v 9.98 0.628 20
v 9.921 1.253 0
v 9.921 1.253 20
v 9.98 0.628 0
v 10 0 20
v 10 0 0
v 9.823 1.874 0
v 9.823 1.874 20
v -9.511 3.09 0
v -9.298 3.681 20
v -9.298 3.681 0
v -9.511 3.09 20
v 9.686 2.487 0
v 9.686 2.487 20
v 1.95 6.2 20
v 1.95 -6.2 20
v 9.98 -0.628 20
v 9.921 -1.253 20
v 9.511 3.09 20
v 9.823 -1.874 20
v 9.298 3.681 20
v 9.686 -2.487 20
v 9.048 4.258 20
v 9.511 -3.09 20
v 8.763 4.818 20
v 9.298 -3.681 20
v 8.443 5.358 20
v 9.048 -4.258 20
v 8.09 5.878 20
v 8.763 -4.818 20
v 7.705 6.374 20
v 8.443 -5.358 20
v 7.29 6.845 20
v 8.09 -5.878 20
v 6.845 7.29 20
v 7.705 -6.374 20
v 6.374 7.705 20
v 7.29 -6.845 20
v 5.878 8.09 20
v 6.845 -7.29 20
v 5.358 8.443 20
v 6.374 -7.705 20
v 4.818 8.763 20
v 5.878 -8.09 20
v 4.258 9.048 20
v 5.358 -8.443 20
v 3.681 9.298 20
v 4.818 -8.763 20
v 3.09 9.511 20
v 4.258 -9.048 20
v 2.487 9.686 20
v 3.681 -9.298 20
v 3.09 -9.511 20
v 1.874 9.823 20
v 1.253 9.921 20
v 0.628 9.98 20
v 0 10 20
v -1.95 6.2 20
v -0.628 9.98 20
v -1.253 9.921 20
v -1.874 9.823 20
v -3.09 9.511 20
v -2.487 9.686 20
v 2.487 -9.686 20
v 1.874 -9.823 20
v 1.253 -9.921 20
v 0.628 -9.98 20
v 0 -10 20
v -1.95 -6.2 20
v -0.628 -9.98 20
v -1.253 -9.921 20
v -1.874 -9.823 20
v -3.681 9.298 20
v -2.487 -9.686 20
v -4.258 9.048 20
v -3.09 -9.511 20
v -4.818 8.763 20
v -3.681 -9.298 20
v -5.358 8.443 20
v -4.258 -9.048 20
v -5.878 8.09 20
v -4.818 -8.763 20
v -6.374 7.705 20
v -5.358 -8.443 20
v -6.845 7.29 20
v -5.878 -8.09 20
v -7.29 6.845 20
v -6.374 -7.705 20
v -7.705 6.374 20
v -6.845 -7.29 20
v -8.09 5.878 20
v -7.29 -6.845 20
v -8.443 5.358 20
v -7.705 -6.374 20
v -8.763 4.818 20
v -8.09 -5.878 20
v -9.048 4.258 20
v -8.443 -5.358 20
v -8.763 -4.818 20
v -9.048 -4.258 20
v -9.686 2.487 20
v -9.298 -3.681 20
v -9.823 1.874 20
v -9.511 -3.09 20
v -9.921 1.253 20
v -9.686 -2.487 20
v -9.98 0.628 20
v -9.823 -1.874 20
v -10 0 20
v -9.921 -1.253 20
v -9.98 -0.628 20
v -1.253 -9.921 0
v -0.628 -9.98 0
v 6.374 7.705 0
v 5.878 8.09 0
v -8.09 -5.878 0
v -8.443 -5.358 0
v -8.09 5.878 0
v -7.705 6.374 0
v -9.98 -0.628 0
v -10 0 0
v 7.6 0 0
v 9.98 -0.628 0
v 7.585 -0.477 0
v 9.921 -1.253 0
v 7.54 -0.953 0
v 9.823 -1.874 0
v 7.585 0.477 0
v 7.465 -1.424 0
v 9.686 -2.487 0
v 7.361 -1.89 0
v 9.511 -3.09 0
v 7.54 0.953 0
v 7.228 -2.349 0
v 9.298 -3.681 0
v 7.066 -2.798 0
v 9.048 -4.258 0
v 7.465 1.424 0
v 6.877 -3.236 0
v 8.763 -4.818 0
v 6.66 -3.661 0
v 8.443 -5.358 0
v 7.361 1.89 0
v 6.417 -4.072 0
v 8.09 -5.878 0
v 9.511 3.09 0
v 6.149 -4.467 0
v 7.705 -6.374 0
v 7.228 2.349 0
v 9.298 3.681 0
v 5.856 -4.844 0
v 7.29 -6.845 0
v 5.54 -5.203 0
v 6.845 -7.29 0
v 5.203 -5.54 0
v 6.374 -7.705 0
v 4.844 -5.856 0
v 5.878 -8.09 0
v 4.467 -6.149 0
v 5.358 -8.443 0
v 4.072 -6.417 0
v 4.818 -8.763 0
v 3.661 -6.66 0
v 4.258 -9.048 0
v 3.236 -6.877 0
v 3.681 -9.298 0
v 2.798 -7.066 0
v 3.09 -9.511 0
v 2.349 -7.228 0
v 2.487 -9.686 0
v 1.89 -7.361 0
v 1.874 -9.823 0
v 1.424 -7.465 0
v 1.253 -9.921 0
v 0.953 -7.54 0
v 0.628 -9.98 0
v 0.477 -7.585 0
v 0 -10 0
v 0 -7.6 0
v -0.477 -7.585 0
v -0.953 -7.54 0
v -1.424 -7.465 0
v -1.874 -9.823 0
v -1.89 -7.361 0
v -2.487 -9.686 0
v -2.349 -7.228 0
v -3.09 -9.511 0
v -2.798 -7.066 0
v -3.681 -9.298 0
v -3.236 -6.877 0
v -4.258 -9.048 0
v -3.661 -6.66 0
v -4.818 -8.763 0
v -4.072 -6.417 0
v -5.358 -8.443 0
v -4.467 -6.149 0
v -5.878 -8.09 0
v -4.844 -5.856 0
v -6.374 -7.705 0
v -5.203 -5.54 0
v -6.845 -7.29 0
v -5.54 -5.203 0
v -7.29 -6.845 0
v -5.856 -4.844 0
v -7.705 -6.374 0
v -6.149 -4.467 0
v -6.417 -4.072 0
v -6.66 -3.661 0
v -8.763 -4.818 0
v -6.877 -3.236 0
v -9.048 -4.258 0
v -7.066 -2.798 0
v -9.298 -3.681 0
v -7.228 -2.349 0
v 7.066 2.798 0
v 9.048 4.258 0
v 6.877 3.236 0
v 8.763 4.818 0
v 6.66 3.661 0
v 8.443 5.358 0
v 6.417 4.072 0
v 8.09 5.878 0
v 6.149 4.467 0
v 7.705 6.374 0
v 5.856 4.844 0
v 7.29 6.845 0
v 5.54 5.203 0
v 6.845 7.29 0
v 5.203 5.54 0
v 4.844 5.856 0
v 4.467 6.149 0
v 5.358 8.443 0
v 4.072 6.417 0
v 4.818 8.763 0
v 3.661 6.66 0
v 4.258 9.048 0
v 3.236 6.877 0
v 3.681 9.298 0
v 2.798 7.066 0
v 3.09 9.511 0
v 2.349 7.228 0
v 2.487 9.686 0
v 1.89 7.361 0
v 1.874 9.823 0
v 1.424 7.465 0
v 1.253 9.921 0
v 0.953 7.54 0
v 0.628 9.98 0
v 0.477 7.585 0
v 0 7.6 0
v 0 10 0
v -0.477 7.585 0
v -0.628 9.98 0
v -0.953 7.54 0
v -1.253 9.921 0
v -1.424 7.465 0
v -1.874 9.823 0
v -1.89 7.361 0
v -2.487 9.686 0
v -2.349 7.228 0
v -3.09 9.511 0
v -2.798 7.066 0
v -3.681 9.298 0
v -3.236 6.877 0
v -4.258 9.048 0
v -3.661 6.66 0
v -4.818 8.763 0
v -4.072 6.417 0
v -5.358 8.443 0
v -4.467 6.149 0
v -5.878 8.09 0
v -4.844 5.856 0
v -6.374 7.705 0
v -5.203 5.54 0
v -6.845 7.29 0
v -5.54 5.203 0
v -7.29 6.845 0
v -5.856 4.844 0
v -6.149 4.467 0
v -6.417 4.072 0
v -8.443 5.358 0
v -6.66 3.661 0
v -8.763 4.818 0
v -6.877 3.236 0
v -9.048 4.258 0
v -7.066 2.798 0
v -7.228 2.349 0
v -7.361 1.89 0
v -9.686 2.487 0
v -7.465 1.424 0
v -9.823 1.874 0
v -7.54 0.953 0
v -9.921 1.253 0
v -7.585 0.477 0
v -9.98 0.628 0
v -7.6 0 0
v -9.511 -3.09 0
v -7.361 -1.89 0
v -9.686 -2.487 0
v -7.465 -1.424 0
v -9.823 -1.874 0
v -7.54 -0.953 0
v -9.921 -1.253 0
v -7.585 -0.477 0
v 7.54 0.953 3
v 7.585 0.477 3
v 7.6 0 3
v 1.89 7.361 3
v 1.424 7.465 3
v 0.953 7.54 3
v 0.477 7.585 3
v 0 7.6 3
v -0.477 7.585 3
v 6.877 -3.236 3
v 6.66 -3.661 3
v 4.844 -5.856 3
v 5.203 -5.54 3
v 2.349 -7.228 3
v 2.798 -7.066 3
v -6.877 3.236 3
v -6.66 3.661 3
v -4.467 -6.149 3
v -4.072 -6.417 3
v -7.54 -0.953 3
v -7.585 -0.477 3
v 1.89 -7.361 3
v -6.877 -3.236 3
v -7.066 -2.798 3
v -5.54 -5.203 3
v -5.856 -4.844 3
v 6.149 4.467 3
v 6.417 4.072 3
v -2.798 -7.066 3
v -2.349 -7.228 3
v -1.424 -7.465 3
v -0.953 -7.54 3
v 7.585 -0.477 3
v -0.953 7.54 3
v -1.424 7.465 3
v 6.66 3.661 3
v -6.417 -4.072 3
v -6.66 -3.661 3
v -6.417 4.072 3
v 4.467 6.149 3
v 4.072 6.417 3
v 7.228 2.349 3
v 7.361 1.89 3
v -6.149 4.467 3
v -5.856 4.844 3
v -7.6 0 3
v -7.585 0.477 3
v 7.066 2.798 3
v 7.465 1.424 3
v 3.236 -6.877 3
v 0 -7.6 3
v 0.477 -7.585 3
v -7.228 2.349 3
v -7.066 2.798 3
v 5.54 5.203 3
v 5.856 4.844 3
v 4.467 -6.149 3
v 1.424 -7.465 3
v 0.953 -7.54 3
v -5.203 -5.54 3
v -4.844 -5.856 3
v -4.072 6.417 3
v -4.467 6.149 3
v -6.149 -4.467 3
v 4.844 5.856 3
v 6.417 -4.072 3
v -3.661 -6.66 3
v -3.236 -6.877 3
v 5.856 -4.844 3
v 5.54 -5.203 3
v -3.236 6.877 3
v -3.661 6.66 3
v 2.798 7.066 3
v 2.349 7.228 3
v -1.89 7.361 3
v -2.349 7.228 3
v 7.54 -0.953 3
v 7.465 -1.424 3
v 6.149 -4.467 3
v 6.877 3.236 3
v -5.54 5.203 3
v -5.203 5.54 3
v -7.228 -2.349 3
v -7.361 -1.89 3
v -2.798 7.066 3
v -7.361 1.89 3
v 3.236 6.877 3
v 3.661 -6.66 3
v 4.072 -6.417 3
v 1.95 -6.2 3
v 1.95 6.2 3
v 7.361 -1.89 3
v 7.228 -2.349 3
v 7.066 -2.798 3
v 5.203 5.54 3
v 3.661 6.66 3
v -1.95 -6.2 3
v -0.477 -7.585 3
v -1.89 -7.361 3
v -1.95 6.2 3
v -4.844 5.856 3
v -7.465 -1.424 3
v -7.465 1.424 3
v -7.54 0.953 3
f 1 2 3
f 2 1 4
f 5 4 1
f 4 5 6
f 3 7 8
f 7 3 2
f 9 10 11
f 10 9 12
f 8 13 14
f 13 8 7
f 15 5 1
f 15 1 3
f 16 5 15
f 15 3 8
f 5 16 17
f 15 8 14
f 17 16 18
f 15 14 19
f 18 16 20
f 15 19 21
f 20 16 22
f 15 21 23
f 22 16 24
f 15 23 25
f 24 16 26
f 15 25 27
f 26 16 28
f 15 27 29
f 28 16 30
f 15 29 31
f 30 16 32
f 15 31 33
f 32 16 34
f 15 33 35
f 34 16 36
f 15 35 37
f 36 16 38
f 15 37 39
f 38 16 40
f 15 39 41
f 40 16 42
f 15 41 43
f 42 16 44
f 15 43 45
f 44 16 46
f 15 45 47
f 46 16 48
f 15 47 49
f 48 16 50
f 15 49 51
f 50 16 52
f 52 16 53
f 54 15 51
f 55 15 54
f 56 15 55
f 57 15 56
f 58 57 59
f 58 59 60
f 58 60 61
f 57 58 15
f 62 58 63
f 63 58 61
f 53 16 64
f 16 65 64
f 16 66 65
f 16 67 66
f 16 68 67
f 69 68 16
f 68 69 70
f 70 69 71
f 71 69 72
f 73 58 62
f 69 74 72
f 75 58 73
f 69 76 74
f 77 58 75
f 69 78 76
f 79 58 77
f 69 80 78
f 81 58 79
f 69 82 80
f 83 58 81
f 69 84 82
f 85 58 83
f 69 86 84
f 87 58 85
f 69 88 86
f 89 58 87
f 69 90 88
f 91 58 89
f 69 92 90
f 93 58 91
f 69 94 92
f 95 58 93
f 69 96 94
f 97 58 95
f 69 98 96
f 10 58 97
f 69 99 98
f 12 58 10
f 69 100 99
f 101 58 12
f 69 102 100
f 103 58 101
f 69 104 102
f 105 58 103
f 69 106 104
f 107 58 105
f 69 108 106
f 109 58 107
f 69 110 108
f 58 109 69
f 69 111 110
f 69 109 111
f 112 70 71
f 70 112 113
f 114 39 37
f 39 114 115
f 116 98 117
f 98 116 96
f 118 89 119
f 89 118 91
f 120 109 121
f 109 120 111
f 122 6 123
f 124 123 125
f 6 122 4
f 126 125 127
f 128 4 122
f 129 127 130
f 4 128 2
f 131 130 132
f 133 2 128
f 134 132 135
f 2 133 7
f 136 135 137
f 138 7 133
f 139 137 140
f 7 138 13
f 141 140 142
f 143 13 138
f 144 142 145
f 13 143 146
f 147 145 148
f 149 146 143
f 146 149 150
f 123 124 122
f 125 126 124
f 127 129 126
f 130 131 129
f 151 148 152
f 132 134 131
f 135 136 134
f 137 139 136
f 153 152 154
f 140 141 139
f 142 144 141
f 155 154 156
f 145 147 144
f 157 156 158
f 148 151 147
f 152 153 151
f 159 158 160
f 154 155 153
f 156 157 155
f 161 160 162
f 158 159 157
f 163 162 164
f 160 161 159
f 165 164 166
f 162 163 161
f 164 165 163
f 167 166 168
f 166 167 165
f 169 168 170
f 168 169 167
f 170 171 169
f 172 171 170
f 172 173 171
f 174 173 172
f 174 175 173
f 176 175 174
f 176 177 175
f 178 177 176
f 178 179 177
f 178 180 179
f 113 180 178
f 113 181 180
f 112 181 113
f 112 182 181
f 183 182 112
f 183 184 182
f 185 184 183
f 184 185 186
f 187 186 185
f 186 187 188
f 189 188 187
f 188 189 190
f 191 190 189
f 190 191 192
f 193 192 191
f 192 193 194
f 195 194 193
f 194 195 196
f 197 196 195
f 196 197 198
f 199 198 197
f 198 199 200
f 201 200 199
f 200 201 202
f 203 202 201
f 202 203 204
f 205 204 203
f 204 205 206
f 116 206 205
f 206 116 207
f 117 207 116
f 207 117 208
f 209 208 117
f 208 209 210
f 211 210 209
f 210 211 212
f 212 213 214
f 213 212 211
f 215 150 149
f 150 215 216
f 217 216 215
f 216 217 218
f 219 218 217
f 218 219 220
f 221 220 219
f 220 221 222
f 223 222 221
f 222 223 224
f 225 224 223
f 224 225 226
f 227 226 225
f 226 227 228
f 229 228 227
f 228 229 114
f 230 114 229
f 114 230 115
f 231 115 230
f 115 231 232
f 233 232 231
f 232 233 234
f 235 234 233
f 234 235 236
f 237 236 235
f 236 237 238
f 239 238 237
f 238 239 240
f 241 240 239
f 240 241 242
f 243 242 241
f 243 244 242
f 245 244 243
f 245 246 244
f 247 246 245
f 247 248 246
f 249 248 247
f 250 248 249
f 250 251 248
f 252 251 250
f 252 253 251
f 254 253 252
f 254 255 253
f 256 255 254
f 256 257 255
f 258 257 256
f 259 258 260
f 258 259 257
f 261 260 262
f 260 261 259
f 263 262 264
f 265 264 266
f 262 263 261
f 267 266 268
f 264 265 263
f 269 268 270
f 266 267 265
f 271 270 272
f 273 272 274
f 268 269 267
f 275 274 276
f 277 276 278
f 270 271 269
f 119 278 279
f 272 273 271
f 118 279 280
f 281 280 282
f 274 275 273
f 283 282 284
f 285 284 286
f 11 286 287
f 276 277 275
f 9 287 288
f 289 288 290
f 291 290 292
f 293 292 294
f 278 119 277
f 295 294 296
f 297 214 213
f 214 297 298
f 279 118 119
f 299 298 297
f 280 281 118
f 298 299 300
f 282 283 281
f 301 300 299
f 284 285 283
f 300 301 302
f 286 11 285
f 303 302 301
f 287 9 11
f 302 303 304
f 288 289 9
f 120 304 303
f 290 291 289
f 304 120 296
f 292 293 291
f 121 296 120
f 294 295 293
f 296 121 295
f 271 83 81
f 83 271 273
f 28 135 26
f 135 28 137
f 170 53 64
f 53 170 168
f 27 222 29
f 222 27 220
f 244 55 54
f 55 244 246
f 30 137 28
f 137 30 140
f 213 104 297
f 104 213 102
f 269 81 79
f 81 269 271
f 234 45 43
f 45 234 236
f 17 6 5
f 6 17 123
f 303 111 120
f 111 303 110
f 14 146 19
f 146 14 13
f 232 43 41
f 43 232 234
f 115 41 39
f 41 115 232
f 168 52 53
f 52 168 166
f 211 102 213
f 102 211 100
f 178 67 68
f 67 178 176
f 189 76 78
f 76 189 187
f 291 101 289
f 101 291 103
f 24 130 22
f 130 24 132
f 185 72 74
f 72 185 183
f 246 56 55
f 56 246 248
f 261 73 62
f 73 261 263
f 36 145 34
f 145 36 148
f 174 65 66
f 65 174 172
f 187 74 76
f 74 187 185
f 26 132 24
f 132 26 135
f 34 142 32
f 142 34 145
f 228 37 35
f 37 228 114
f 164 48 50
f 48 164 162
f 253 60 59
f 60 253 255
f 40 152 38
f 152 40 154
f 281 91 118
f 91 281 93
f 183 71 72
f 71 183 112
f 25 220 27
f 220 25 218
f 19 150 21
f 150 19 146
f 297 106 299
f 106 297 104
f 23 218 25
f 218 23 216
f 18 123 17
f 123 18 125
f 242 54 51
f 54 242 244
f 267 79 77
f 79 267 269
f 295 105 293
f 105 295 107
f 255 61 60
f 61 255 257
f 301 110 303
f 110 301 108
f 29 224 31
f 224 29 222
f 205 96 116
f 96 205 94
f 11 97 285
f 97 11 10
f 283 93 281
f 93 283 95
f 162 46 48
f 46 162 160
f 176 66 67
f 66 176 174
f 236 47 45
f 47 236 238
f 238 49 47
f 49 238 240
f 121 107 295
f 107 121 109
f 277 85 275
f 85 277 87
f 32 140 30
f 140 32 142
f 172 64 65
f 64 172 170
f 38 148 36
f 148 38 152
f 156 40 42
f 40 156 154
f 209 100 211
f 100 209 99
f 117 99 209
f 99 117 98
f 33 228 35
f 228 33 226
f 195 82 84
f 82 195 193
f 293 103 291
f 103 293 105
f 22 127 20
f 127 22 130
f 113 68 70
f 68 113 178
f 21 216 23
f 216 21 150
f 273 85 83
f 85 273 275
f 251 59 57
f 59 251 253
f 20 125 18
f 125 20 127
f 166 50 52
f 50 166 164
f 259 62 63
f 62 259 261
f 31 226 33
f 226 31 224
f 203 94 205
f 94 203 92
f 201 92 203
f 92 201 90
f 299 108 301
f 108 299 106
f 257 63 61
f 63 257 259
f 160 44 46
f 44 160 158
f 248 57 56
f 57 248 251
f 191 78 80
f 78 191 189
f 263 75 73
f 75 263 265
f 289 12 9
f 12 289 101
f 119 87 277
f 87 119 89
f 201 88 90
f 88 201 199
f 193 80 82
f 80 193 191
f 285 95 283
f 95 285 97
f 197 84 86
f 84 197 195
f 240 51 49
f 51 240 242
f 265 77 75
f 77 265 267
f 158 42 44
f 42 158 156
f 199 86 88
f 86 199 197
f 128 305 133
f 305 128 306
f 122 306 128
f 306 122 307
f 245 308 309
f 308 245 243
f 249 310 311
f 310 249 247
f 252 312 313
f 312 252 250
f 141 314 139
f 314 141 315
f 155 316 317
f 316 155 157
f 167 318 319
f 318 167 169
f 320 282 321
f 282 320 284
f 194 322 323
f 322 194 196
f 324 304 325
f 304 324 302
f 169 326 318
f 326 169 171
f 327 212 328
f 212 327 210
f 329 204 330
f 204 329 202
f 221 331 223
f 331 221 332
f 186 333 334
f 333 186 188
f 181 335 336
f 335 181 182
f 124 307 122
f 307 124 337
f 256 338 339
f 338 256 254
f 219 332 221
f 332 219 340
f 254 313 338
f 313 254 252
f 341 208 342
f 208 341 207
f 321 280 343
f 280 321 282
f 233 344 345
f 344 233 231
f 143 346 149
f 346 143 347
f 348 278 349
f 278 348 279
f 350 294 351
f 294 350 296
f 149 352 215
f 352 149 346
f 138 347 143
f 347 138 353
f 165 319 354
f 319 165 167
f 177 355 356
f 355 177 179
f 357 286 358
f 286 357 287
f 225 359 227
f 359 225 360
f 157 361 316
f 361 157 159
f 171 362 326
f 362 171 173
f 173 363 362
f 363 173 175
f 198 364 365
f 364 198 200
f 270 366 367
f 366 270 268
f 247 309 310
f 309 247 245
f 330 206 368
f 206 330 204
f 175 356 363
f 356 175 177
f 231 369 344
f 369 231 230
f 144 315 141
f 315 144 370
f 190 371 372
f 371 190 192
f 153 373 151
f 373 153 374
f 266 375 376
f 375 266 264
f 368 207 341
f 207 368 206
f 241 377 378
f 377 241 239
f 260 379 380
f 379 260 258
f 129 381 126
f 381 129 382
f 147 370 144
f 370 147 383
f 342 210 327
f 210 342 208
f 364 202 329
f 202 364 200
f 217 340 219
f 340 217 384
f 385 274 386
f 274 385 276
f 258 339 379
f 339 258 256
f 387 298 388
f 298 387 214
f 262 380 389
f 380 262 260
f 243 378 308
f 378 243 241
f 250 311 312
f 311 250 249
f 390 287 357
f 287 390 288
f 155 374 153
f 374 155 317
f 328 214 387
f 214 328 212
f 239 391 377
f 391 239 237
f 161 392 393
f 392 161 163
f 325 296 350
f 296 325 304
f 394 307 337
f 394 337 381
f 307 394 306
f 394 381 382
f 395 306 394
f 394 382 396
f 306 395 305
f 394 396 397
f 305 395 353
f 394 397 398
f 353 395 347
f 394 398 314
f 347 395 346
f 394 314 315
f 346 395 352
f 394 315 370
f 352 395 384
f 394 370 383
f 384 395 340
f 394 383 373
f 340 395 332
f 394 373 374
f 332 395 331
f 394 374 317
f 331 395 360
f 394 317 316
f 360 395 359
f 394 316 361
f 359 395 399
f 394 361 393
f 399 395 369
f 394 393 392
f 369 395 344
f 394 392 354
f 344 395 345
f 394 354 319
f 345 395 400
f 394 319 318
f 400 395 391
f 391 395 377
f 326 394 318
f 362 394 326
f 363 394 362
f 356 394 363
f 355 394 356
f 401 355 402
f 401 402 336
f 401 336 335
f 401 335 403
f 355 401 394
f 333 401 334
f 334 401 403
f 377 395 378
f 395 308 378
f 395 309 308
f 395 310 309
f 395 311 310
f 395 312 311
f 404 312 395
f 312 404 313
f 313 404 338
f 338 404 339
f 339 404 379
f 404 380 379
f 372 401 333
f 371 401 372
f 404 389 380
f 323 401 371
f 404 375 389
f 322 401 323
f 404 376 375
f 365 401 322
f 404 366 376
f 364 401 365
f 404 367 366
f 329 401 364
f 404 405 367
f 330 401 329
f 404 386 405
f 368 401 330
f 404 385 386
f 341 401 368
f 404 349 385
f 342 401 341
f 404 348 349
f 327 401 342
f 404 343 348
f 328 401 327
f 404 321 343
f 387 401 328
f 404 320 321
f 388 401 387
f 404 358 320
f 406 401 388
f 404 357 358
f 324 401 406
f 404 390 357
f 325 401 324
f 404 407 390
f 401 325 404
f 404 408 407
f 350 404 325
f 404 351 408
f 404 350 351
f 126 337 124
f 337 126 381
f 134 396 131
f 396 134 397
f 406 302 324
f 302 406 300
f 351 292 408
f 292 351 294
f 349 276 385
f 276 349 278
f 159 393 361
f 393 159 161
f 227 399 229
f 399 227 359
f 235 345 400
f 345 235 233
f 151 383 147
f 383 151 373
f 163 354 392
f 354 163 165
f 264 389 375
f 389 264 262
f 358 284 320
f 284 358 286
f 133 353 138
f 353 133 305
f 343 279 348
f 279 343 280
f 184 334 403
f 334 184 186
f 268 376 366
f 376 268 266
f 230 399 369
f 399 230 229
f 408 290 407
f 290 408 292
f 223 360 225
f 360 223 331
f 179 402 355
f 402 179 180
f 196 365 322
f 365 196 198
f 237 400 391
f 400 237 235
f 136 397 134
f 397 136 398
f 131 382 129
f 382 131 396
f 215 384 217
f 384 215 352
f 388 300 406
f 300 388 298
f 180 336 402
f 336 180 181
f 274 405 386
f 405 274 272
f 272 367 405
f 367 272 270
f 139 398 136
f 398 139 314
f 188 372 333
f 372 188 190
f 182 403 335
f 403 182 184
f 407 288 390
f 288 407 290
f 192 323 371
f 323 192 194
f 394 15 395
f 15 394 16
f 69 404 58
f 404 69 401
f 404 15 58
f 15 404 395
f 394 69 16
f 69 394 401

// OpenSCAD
THICKNESS = 3.5;

VERTICAL_LENGTH = 120;
VERTICAL_WIDTH = 12;
VERTICAL_SLOT_DIA = 4.5;
VERTICAL_SLOT_LENGTH = VERTICAL_LENGTH - 50;
VERTICAL_INLAY_DIA = 7.2;
VERTICAL_INLAY_DEPTH = 2;

HORIZONTAL_LENGTH = 120;
HORIZONTAL_WIDTH = VERTICAL_WIDTH;
HORIZONTAL_SLOT_DIA = VERTICAL_SLOT_DIA;
HORIZONTAL_SLOT_LENGTH = HORIZONTAL_LENGTH - 20;
HORIZONTAL_HEAD_DIA = 3.5;
HORIZONTAL_HEAD_INLAY_DIA = 6.4;
HORIZONTAL_HEAD_INLAY_DEPTH = VERTICAL_INLAY_DEPTH;

BASE_HEIGHT = 20;
BASE_DIA = 20;

MAGNET_DIA = 15.2;
MAGNET_THICKNESS = 3;

PROBE_INNER_DIA = 6.5;
PROBE_OUTER_DIA = PROBE_INNER_DIA + 2 * THICKNESS;
PROBE_THICKNESS = 4;
PROBE_LENGTH = 20;
PROBE_ANGLE = 30;


$fn = 100;

module slot(dia, length, thickness) {
  hull() {
    for(i = [-1, 1]) {
      translate([i * (length - dia)/2, 0, 0])
      cylinder(d = dia, h = thickness);
    }
  }
}

module vertical() {
  difference() {
    hull() {
      slot(VERTICAL_WIDTH, VERTICAL_SLOT_LENGTH, THICKNESS);
      translate([VERTICAL_LENGTH/2, 0, THICKNESS/2])
      cube(size = [VERTICAL_LENGTH - VERTICAL_SLOT_LENGTH, VERTICAL_WIDTH, THICKNESS], center = true);
    }
    slot(VERTICAL_SLOT_DIA, VERTICAL_SLOT_LENGTH - VERTICAL_WIDTH/2, THICKNESS);
    slot(VERTICAL_INLAY_DIA, VERTICAL_SLOT_LENGTH - VERTICAL_WIDTH/2 + VERTICAL_SLOT_DIA/2, VERTICAL_INLAY_DEPTH);
  }
}

module horizontal() {
  difference() {
    t = HORIZONTAL_LENGTH/2 + (HORIZONTAL_LENGTH - HORIZONTAL_SLOT_LENGTH - HORIZONTAL_WIDTH)/2;
    
    hull() {
      slot(HORIZONTAL_WIDTH, HORIZONTAL_SLOT_LENGTH, THICKNESS);
      translate([t, 0, 0])
      cylinder(d = HORIZONTAL_WIDTH, h = THICKNESS);
    }
    slot(HORIZONTAL_SLOT_DIA, HORIZONTAL_SLOT_LENGTH - HORIZONTAL_WIDTH/2, THICKNESS);
    
    translate([t, 0, 0]) {
      cylinder(d = HORIZONTAL_HEAD_DIA, h = THICKNESS);

      cylinder(d = HORIZONTAL_HEAD_INLAY_DIA, h = HORIZONTAL_HEAD_INLAY_DEPTH, $fn = 6);
    }
  }
}

module base() {
  difference() {
    cylinder(d = BASE_DIA, h = BASE_HEIGHT);
    cylinder(d = MAGNET_DIA, h = MAGNET_THICKNESS);
    delta = 0.4;
    cube(size = [THICKNESS + delta, VERTICAL_WIDTH + delta, VERTICAL_LENGTH], center = true);
  }
}

module probe() {
  difference() {
    union() {
      translate([THICKNESS/3, -(PROBE_OUTER_DIA/2-THICKNESS), 0])
      rotate([0, -PROBE_ANGLE, 0])
      cylinder(d = PROBE_OUTER_DIA, h = PROBE_THICKNESS);

      cube(size = [PROBE_LENGTH, THICKNESS, PROBE_THICKNESS]);

      translate([PROBE_LENGTH, THICKNESS, 0])
      rotate([90, 0, 0])
      cylinder(d = HORIZONTAL_WIDTH, h = THICKNESS);
    }
    translate([THICKNESS/3, -(PROBE_OUTER_DIA/2-THICKNESS), 0])
    rotate([0, -PROBE_ANGLE, 0])
    translate([0, 0, -PROBE_THICKNESS/2]) {
      cylinder(d = PROBE_INNER_DIA, h = PROBE_THICKNESS * 2);
      translate([-0.5, -PROBE_OUTER_DIA, PROBE_THICKNESS/2])
      #cube(size = [1, PROBE_OUTER_DIA, PROBE_THICKNESS]);
    }

    translate([PROBE_LENGTH, THICKNESS, 0])
    rotate([90, 0, 0])
    cylinder(d = HORIZONTAL_HEAD_DIA, h = THICKNESS);
  }
}

!base();
vertical();
horizontal();
probe();
